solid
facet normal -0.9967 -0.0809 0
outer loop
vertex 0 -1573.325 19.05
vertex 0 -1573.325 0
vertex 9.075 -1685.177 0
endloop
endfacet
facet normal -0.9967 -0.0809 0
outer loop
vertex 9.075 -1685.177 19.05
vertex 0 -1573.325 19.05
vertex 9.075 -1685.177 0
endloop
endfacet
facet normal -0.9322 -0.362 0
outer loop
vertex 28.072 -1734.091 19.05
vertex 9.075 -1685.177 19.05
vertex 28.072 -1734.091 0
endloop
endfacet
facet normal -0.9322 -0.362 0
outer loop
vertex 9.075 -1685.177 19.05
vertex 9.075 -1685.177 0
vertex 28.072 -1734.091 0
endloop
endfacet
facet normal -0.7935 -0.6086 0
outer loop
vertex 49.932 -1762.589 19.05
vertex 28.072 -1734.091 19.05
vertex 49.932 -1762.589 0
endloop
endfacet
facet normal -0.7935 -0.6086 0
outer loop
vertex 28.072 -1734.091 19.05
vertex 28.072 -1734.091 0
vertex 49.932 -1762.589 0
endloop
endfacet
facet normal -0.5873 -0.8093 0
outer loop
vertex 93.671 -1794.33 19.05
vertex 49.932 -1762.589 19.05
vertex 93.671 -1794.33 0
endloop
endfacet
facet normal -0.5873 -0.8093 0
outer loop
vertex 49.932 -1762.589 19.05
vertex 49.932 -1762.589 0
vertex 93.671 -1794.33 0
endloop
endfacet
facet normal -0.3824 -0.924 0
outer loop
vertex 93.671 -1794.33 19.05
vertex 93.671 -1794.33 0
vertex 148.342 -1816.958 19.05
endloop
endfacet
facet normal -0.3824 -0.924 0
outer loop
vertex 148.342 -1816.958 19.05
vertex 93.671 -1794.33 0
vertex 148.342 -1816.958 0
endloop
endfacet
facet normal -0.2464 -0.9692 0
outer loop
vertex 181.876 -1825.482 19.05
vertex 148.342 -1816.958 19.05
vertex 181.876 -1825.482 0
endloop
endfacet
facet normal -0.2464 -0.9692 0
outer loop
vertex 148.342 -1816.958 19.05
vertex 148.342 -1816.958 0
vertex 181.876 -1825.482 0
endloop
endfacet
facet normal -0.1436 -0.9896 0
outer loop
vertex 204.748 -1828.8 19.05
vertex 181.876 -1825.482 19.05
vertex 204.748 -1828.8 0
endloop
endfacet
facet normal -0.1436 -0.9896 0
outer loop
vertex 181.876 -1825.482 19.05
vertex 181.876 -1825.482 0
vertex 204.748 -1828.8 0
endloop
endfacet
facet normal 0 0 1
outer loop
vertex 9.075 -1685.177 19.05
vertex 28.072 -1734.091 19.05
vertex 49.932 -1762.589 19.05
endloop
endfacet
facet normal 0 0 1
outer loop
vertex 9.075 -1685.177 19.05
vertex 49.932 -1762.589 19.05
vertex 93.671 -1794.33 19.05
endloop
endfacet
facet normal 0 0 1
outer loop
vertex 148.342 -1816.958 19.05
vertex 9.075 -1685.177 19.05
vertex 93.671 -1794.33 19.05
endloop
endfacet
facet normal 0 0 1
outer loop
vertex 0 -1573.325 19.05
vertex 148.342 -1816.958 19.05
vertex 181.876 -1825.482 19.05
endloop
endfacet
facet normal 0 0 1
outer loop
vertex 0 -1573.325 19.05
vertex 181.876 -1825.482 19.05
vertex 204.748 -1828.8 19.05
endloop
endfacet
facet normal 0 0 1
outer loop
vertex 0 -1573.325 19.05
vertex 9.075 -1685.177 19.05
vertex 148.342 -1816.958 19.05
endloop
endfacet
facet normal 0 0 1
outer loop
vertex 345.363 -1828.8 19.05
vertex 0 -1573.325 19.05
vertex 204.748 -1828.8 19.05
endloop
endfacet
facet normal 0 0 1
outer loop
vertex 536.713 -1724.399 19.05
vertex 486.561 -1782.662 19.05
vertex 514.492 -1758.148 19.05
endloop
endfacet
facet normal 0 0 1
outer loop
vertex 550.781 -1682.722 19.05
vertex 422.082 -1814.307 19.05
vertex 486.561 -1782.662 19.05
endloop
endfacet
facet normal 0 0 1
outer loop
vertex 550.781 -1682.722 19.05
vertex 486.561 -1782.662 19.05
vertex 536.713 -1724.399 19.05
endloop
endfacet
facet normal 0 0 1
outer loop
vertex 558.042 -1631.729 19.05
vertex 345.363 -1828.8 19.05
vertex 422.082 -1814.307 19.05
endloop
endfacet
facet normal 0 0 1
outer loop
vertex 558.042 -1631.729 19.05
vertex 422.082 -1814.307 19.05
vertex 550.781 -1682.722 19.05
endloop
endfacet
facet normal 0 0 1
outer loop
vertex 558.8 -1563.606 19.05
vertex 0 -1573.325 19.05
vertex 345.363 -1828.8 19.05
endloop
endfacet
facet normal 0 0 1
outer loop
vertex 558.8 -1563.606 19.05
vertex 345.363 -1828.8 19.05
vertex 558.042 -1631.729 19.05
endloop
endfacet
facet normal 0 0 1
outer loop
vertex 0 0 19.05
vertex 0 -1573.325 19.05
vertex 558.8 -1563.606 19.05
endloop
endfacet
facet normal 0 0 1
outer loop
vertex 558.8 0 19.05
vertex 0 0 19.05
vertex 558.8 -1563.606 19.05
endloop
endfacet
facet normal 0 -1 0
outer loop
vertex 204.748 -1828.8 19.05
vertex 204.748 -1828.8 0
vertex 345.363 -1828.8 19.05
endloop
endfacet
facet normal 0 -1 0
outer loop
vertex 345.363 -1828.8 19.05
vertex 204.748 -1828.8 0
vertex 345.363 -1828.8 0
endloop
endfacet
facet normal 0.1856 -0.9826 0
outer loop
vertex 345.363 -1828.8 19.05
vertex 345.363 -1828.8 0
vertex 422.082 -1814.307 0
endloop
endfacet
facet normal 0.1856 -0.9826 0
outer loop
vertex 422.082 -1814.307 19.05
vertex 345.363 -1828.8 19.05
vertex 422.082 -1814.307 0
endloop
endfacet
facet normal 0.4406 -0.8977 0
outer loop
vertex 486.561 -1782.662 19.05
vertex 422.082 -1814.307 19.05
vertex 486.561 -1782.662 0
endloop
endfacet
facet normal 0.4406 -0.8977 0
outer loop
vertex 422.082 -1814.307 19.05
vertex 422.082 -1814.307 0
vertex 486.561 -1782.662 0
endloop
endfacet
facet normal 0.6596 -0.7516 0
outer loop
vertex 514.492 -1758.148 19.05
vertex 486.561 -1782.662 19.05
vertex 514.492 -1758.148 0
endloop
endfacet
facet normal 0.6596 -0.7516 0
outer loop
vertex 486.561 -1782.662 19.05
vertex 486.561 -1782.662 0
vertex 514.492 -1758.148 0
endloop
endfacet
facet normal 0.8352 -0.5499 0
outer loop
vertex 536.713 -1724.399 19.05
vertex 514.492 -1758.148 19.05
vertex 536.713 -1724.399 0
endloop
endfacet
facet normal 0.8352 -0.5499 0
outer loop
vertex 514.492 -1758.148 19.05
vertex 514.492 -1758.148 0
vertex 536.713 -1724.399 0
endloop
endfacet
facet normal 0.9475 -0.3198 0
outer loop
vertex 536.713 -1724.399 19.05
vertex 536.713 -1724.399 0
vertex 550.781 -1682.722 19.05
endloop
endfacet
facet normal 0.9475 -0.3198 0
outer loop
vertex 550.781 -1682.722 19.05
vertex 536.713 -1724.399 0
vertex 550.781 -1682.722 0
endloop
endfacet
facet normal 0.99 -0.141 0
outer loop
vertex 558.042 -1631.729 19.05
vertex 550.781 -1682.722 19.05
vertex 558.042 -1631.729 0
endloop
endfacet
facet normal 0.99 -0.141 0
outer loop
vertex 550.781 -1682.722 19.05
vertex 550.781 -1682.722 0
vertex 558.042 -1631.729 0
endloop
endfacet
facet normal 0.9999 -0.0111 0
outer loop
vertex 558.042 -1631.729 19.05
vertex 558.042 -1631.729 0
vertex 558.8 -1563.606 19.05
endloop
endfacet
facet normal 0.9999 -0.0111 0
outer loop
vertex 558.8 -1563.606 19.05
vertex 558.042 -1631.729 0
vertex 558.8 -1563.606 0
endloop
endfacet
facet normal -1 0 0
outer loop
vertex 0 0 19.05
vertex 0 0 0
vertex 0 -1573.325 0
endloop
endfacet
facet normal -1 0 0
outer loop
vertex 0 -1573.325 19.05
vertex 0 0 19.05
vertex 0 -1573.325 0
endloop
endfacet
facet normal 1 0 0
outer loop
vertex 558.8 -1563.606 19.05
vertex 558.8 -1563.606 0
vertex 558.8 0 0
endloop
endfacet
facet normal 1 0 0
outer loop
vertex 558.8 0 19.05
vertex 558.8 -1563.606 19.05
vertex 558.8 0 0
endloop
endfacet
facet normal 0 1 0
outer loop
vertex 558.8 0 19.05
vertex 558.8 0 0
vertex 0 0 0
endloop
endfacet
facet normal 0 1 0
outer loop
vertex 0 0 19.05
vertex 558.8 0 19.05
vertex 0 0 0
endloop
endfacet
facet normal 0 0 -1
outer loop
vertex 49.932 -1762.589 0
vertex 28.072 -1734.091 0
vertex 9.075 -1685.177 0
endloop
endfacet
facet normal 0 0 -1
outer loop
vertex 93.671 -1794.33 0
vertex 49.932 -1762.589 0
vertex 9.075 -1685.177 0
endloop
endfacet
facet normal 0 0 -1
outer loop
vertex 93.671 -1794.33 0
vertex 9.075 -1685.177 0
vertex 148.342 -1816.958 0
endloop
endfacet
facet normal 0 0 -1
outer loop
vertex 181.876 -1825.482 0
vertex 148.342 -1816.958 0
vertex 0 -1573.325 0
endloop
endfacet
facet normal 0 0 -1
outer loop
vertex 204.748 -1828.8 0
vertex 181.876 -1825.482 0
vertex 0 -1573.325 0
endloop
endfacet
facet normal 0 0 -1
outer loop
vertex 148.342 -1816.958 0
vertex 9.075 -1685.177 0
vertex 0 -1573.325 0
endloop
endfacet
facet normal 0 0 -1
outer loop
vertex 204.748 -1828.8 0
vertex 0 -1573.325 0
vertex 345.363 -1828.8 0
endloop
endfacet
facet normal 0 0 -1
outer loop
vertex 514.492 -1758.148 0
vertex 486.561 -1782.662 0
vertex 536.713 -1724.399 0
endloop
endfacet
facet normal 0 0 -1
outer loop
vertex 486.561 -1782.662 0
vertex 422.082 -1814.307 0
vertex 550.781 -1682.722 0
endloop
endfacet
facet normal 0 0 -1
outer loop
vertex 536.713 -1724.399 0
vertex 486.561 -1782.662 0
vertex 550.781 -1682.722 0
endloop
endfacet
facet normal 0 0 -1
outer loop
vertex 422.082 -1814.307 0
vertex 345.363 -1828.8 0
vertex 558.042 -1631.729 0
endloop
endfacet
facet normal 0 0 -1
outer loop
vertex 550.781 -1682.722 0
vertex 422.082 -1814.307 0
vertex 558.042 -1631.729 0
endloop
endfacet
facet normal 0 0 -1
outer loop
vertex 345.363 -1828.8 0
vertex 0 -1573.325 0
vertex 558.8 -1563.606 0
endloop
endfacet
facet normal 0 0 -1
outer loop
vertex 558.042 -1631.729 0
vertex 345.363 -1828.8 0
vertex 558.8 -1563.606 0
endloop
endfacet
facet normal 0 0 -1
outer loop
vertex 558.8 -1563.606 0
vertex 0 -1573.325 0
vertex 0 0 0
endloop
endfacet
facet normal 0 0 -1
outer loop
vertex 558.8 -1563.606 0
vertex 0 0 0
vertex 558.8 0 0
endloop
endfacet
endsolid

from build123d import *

# Parameters (mm, degrees)
F1_DEPTH = 19.05


with BuildPart() as f1:
    # F0 (on Top) → F1 (new body)
    with BuildSketch(Plane.XY):
        with BuildLine():
            Line((558.8, 0), (0, 0))
            Line((0, 0), (0, -1573.3252388448))
            add(Edge.make_bspline(
                [(0, -1573.3252388448), (0, -1599.3355649967), (-11.3167588952, -1787.3028003545), (178.3879735857, -1827.0957518131), (204.7477325159, -1828.8)],
                knots=[0, 0, 0, 0, 0.4975483488, 1, 1, 1, 1], degree=3))
            Line((204.7477325159, -1828.8), (345.3625738621, -1828.8))
            add(Edge.make_bspline(
                [(345.3625738621, -1828.8), (385.9299482714, -1828.5200882781), (573.027412907, -1785.7629185932), (558.7186116148, -1592.4349843346), (558.8, -1563.6059045792)],
                knots=[0, 0, 0, 0, 0.5067159085, 1, 1, 1, 1], degree=3))
            Line((558.8, -1563.6059045792), (558.8, 0))
        make_face()
    extrude(amount=F1_DEPTH)


solid = f1.part
